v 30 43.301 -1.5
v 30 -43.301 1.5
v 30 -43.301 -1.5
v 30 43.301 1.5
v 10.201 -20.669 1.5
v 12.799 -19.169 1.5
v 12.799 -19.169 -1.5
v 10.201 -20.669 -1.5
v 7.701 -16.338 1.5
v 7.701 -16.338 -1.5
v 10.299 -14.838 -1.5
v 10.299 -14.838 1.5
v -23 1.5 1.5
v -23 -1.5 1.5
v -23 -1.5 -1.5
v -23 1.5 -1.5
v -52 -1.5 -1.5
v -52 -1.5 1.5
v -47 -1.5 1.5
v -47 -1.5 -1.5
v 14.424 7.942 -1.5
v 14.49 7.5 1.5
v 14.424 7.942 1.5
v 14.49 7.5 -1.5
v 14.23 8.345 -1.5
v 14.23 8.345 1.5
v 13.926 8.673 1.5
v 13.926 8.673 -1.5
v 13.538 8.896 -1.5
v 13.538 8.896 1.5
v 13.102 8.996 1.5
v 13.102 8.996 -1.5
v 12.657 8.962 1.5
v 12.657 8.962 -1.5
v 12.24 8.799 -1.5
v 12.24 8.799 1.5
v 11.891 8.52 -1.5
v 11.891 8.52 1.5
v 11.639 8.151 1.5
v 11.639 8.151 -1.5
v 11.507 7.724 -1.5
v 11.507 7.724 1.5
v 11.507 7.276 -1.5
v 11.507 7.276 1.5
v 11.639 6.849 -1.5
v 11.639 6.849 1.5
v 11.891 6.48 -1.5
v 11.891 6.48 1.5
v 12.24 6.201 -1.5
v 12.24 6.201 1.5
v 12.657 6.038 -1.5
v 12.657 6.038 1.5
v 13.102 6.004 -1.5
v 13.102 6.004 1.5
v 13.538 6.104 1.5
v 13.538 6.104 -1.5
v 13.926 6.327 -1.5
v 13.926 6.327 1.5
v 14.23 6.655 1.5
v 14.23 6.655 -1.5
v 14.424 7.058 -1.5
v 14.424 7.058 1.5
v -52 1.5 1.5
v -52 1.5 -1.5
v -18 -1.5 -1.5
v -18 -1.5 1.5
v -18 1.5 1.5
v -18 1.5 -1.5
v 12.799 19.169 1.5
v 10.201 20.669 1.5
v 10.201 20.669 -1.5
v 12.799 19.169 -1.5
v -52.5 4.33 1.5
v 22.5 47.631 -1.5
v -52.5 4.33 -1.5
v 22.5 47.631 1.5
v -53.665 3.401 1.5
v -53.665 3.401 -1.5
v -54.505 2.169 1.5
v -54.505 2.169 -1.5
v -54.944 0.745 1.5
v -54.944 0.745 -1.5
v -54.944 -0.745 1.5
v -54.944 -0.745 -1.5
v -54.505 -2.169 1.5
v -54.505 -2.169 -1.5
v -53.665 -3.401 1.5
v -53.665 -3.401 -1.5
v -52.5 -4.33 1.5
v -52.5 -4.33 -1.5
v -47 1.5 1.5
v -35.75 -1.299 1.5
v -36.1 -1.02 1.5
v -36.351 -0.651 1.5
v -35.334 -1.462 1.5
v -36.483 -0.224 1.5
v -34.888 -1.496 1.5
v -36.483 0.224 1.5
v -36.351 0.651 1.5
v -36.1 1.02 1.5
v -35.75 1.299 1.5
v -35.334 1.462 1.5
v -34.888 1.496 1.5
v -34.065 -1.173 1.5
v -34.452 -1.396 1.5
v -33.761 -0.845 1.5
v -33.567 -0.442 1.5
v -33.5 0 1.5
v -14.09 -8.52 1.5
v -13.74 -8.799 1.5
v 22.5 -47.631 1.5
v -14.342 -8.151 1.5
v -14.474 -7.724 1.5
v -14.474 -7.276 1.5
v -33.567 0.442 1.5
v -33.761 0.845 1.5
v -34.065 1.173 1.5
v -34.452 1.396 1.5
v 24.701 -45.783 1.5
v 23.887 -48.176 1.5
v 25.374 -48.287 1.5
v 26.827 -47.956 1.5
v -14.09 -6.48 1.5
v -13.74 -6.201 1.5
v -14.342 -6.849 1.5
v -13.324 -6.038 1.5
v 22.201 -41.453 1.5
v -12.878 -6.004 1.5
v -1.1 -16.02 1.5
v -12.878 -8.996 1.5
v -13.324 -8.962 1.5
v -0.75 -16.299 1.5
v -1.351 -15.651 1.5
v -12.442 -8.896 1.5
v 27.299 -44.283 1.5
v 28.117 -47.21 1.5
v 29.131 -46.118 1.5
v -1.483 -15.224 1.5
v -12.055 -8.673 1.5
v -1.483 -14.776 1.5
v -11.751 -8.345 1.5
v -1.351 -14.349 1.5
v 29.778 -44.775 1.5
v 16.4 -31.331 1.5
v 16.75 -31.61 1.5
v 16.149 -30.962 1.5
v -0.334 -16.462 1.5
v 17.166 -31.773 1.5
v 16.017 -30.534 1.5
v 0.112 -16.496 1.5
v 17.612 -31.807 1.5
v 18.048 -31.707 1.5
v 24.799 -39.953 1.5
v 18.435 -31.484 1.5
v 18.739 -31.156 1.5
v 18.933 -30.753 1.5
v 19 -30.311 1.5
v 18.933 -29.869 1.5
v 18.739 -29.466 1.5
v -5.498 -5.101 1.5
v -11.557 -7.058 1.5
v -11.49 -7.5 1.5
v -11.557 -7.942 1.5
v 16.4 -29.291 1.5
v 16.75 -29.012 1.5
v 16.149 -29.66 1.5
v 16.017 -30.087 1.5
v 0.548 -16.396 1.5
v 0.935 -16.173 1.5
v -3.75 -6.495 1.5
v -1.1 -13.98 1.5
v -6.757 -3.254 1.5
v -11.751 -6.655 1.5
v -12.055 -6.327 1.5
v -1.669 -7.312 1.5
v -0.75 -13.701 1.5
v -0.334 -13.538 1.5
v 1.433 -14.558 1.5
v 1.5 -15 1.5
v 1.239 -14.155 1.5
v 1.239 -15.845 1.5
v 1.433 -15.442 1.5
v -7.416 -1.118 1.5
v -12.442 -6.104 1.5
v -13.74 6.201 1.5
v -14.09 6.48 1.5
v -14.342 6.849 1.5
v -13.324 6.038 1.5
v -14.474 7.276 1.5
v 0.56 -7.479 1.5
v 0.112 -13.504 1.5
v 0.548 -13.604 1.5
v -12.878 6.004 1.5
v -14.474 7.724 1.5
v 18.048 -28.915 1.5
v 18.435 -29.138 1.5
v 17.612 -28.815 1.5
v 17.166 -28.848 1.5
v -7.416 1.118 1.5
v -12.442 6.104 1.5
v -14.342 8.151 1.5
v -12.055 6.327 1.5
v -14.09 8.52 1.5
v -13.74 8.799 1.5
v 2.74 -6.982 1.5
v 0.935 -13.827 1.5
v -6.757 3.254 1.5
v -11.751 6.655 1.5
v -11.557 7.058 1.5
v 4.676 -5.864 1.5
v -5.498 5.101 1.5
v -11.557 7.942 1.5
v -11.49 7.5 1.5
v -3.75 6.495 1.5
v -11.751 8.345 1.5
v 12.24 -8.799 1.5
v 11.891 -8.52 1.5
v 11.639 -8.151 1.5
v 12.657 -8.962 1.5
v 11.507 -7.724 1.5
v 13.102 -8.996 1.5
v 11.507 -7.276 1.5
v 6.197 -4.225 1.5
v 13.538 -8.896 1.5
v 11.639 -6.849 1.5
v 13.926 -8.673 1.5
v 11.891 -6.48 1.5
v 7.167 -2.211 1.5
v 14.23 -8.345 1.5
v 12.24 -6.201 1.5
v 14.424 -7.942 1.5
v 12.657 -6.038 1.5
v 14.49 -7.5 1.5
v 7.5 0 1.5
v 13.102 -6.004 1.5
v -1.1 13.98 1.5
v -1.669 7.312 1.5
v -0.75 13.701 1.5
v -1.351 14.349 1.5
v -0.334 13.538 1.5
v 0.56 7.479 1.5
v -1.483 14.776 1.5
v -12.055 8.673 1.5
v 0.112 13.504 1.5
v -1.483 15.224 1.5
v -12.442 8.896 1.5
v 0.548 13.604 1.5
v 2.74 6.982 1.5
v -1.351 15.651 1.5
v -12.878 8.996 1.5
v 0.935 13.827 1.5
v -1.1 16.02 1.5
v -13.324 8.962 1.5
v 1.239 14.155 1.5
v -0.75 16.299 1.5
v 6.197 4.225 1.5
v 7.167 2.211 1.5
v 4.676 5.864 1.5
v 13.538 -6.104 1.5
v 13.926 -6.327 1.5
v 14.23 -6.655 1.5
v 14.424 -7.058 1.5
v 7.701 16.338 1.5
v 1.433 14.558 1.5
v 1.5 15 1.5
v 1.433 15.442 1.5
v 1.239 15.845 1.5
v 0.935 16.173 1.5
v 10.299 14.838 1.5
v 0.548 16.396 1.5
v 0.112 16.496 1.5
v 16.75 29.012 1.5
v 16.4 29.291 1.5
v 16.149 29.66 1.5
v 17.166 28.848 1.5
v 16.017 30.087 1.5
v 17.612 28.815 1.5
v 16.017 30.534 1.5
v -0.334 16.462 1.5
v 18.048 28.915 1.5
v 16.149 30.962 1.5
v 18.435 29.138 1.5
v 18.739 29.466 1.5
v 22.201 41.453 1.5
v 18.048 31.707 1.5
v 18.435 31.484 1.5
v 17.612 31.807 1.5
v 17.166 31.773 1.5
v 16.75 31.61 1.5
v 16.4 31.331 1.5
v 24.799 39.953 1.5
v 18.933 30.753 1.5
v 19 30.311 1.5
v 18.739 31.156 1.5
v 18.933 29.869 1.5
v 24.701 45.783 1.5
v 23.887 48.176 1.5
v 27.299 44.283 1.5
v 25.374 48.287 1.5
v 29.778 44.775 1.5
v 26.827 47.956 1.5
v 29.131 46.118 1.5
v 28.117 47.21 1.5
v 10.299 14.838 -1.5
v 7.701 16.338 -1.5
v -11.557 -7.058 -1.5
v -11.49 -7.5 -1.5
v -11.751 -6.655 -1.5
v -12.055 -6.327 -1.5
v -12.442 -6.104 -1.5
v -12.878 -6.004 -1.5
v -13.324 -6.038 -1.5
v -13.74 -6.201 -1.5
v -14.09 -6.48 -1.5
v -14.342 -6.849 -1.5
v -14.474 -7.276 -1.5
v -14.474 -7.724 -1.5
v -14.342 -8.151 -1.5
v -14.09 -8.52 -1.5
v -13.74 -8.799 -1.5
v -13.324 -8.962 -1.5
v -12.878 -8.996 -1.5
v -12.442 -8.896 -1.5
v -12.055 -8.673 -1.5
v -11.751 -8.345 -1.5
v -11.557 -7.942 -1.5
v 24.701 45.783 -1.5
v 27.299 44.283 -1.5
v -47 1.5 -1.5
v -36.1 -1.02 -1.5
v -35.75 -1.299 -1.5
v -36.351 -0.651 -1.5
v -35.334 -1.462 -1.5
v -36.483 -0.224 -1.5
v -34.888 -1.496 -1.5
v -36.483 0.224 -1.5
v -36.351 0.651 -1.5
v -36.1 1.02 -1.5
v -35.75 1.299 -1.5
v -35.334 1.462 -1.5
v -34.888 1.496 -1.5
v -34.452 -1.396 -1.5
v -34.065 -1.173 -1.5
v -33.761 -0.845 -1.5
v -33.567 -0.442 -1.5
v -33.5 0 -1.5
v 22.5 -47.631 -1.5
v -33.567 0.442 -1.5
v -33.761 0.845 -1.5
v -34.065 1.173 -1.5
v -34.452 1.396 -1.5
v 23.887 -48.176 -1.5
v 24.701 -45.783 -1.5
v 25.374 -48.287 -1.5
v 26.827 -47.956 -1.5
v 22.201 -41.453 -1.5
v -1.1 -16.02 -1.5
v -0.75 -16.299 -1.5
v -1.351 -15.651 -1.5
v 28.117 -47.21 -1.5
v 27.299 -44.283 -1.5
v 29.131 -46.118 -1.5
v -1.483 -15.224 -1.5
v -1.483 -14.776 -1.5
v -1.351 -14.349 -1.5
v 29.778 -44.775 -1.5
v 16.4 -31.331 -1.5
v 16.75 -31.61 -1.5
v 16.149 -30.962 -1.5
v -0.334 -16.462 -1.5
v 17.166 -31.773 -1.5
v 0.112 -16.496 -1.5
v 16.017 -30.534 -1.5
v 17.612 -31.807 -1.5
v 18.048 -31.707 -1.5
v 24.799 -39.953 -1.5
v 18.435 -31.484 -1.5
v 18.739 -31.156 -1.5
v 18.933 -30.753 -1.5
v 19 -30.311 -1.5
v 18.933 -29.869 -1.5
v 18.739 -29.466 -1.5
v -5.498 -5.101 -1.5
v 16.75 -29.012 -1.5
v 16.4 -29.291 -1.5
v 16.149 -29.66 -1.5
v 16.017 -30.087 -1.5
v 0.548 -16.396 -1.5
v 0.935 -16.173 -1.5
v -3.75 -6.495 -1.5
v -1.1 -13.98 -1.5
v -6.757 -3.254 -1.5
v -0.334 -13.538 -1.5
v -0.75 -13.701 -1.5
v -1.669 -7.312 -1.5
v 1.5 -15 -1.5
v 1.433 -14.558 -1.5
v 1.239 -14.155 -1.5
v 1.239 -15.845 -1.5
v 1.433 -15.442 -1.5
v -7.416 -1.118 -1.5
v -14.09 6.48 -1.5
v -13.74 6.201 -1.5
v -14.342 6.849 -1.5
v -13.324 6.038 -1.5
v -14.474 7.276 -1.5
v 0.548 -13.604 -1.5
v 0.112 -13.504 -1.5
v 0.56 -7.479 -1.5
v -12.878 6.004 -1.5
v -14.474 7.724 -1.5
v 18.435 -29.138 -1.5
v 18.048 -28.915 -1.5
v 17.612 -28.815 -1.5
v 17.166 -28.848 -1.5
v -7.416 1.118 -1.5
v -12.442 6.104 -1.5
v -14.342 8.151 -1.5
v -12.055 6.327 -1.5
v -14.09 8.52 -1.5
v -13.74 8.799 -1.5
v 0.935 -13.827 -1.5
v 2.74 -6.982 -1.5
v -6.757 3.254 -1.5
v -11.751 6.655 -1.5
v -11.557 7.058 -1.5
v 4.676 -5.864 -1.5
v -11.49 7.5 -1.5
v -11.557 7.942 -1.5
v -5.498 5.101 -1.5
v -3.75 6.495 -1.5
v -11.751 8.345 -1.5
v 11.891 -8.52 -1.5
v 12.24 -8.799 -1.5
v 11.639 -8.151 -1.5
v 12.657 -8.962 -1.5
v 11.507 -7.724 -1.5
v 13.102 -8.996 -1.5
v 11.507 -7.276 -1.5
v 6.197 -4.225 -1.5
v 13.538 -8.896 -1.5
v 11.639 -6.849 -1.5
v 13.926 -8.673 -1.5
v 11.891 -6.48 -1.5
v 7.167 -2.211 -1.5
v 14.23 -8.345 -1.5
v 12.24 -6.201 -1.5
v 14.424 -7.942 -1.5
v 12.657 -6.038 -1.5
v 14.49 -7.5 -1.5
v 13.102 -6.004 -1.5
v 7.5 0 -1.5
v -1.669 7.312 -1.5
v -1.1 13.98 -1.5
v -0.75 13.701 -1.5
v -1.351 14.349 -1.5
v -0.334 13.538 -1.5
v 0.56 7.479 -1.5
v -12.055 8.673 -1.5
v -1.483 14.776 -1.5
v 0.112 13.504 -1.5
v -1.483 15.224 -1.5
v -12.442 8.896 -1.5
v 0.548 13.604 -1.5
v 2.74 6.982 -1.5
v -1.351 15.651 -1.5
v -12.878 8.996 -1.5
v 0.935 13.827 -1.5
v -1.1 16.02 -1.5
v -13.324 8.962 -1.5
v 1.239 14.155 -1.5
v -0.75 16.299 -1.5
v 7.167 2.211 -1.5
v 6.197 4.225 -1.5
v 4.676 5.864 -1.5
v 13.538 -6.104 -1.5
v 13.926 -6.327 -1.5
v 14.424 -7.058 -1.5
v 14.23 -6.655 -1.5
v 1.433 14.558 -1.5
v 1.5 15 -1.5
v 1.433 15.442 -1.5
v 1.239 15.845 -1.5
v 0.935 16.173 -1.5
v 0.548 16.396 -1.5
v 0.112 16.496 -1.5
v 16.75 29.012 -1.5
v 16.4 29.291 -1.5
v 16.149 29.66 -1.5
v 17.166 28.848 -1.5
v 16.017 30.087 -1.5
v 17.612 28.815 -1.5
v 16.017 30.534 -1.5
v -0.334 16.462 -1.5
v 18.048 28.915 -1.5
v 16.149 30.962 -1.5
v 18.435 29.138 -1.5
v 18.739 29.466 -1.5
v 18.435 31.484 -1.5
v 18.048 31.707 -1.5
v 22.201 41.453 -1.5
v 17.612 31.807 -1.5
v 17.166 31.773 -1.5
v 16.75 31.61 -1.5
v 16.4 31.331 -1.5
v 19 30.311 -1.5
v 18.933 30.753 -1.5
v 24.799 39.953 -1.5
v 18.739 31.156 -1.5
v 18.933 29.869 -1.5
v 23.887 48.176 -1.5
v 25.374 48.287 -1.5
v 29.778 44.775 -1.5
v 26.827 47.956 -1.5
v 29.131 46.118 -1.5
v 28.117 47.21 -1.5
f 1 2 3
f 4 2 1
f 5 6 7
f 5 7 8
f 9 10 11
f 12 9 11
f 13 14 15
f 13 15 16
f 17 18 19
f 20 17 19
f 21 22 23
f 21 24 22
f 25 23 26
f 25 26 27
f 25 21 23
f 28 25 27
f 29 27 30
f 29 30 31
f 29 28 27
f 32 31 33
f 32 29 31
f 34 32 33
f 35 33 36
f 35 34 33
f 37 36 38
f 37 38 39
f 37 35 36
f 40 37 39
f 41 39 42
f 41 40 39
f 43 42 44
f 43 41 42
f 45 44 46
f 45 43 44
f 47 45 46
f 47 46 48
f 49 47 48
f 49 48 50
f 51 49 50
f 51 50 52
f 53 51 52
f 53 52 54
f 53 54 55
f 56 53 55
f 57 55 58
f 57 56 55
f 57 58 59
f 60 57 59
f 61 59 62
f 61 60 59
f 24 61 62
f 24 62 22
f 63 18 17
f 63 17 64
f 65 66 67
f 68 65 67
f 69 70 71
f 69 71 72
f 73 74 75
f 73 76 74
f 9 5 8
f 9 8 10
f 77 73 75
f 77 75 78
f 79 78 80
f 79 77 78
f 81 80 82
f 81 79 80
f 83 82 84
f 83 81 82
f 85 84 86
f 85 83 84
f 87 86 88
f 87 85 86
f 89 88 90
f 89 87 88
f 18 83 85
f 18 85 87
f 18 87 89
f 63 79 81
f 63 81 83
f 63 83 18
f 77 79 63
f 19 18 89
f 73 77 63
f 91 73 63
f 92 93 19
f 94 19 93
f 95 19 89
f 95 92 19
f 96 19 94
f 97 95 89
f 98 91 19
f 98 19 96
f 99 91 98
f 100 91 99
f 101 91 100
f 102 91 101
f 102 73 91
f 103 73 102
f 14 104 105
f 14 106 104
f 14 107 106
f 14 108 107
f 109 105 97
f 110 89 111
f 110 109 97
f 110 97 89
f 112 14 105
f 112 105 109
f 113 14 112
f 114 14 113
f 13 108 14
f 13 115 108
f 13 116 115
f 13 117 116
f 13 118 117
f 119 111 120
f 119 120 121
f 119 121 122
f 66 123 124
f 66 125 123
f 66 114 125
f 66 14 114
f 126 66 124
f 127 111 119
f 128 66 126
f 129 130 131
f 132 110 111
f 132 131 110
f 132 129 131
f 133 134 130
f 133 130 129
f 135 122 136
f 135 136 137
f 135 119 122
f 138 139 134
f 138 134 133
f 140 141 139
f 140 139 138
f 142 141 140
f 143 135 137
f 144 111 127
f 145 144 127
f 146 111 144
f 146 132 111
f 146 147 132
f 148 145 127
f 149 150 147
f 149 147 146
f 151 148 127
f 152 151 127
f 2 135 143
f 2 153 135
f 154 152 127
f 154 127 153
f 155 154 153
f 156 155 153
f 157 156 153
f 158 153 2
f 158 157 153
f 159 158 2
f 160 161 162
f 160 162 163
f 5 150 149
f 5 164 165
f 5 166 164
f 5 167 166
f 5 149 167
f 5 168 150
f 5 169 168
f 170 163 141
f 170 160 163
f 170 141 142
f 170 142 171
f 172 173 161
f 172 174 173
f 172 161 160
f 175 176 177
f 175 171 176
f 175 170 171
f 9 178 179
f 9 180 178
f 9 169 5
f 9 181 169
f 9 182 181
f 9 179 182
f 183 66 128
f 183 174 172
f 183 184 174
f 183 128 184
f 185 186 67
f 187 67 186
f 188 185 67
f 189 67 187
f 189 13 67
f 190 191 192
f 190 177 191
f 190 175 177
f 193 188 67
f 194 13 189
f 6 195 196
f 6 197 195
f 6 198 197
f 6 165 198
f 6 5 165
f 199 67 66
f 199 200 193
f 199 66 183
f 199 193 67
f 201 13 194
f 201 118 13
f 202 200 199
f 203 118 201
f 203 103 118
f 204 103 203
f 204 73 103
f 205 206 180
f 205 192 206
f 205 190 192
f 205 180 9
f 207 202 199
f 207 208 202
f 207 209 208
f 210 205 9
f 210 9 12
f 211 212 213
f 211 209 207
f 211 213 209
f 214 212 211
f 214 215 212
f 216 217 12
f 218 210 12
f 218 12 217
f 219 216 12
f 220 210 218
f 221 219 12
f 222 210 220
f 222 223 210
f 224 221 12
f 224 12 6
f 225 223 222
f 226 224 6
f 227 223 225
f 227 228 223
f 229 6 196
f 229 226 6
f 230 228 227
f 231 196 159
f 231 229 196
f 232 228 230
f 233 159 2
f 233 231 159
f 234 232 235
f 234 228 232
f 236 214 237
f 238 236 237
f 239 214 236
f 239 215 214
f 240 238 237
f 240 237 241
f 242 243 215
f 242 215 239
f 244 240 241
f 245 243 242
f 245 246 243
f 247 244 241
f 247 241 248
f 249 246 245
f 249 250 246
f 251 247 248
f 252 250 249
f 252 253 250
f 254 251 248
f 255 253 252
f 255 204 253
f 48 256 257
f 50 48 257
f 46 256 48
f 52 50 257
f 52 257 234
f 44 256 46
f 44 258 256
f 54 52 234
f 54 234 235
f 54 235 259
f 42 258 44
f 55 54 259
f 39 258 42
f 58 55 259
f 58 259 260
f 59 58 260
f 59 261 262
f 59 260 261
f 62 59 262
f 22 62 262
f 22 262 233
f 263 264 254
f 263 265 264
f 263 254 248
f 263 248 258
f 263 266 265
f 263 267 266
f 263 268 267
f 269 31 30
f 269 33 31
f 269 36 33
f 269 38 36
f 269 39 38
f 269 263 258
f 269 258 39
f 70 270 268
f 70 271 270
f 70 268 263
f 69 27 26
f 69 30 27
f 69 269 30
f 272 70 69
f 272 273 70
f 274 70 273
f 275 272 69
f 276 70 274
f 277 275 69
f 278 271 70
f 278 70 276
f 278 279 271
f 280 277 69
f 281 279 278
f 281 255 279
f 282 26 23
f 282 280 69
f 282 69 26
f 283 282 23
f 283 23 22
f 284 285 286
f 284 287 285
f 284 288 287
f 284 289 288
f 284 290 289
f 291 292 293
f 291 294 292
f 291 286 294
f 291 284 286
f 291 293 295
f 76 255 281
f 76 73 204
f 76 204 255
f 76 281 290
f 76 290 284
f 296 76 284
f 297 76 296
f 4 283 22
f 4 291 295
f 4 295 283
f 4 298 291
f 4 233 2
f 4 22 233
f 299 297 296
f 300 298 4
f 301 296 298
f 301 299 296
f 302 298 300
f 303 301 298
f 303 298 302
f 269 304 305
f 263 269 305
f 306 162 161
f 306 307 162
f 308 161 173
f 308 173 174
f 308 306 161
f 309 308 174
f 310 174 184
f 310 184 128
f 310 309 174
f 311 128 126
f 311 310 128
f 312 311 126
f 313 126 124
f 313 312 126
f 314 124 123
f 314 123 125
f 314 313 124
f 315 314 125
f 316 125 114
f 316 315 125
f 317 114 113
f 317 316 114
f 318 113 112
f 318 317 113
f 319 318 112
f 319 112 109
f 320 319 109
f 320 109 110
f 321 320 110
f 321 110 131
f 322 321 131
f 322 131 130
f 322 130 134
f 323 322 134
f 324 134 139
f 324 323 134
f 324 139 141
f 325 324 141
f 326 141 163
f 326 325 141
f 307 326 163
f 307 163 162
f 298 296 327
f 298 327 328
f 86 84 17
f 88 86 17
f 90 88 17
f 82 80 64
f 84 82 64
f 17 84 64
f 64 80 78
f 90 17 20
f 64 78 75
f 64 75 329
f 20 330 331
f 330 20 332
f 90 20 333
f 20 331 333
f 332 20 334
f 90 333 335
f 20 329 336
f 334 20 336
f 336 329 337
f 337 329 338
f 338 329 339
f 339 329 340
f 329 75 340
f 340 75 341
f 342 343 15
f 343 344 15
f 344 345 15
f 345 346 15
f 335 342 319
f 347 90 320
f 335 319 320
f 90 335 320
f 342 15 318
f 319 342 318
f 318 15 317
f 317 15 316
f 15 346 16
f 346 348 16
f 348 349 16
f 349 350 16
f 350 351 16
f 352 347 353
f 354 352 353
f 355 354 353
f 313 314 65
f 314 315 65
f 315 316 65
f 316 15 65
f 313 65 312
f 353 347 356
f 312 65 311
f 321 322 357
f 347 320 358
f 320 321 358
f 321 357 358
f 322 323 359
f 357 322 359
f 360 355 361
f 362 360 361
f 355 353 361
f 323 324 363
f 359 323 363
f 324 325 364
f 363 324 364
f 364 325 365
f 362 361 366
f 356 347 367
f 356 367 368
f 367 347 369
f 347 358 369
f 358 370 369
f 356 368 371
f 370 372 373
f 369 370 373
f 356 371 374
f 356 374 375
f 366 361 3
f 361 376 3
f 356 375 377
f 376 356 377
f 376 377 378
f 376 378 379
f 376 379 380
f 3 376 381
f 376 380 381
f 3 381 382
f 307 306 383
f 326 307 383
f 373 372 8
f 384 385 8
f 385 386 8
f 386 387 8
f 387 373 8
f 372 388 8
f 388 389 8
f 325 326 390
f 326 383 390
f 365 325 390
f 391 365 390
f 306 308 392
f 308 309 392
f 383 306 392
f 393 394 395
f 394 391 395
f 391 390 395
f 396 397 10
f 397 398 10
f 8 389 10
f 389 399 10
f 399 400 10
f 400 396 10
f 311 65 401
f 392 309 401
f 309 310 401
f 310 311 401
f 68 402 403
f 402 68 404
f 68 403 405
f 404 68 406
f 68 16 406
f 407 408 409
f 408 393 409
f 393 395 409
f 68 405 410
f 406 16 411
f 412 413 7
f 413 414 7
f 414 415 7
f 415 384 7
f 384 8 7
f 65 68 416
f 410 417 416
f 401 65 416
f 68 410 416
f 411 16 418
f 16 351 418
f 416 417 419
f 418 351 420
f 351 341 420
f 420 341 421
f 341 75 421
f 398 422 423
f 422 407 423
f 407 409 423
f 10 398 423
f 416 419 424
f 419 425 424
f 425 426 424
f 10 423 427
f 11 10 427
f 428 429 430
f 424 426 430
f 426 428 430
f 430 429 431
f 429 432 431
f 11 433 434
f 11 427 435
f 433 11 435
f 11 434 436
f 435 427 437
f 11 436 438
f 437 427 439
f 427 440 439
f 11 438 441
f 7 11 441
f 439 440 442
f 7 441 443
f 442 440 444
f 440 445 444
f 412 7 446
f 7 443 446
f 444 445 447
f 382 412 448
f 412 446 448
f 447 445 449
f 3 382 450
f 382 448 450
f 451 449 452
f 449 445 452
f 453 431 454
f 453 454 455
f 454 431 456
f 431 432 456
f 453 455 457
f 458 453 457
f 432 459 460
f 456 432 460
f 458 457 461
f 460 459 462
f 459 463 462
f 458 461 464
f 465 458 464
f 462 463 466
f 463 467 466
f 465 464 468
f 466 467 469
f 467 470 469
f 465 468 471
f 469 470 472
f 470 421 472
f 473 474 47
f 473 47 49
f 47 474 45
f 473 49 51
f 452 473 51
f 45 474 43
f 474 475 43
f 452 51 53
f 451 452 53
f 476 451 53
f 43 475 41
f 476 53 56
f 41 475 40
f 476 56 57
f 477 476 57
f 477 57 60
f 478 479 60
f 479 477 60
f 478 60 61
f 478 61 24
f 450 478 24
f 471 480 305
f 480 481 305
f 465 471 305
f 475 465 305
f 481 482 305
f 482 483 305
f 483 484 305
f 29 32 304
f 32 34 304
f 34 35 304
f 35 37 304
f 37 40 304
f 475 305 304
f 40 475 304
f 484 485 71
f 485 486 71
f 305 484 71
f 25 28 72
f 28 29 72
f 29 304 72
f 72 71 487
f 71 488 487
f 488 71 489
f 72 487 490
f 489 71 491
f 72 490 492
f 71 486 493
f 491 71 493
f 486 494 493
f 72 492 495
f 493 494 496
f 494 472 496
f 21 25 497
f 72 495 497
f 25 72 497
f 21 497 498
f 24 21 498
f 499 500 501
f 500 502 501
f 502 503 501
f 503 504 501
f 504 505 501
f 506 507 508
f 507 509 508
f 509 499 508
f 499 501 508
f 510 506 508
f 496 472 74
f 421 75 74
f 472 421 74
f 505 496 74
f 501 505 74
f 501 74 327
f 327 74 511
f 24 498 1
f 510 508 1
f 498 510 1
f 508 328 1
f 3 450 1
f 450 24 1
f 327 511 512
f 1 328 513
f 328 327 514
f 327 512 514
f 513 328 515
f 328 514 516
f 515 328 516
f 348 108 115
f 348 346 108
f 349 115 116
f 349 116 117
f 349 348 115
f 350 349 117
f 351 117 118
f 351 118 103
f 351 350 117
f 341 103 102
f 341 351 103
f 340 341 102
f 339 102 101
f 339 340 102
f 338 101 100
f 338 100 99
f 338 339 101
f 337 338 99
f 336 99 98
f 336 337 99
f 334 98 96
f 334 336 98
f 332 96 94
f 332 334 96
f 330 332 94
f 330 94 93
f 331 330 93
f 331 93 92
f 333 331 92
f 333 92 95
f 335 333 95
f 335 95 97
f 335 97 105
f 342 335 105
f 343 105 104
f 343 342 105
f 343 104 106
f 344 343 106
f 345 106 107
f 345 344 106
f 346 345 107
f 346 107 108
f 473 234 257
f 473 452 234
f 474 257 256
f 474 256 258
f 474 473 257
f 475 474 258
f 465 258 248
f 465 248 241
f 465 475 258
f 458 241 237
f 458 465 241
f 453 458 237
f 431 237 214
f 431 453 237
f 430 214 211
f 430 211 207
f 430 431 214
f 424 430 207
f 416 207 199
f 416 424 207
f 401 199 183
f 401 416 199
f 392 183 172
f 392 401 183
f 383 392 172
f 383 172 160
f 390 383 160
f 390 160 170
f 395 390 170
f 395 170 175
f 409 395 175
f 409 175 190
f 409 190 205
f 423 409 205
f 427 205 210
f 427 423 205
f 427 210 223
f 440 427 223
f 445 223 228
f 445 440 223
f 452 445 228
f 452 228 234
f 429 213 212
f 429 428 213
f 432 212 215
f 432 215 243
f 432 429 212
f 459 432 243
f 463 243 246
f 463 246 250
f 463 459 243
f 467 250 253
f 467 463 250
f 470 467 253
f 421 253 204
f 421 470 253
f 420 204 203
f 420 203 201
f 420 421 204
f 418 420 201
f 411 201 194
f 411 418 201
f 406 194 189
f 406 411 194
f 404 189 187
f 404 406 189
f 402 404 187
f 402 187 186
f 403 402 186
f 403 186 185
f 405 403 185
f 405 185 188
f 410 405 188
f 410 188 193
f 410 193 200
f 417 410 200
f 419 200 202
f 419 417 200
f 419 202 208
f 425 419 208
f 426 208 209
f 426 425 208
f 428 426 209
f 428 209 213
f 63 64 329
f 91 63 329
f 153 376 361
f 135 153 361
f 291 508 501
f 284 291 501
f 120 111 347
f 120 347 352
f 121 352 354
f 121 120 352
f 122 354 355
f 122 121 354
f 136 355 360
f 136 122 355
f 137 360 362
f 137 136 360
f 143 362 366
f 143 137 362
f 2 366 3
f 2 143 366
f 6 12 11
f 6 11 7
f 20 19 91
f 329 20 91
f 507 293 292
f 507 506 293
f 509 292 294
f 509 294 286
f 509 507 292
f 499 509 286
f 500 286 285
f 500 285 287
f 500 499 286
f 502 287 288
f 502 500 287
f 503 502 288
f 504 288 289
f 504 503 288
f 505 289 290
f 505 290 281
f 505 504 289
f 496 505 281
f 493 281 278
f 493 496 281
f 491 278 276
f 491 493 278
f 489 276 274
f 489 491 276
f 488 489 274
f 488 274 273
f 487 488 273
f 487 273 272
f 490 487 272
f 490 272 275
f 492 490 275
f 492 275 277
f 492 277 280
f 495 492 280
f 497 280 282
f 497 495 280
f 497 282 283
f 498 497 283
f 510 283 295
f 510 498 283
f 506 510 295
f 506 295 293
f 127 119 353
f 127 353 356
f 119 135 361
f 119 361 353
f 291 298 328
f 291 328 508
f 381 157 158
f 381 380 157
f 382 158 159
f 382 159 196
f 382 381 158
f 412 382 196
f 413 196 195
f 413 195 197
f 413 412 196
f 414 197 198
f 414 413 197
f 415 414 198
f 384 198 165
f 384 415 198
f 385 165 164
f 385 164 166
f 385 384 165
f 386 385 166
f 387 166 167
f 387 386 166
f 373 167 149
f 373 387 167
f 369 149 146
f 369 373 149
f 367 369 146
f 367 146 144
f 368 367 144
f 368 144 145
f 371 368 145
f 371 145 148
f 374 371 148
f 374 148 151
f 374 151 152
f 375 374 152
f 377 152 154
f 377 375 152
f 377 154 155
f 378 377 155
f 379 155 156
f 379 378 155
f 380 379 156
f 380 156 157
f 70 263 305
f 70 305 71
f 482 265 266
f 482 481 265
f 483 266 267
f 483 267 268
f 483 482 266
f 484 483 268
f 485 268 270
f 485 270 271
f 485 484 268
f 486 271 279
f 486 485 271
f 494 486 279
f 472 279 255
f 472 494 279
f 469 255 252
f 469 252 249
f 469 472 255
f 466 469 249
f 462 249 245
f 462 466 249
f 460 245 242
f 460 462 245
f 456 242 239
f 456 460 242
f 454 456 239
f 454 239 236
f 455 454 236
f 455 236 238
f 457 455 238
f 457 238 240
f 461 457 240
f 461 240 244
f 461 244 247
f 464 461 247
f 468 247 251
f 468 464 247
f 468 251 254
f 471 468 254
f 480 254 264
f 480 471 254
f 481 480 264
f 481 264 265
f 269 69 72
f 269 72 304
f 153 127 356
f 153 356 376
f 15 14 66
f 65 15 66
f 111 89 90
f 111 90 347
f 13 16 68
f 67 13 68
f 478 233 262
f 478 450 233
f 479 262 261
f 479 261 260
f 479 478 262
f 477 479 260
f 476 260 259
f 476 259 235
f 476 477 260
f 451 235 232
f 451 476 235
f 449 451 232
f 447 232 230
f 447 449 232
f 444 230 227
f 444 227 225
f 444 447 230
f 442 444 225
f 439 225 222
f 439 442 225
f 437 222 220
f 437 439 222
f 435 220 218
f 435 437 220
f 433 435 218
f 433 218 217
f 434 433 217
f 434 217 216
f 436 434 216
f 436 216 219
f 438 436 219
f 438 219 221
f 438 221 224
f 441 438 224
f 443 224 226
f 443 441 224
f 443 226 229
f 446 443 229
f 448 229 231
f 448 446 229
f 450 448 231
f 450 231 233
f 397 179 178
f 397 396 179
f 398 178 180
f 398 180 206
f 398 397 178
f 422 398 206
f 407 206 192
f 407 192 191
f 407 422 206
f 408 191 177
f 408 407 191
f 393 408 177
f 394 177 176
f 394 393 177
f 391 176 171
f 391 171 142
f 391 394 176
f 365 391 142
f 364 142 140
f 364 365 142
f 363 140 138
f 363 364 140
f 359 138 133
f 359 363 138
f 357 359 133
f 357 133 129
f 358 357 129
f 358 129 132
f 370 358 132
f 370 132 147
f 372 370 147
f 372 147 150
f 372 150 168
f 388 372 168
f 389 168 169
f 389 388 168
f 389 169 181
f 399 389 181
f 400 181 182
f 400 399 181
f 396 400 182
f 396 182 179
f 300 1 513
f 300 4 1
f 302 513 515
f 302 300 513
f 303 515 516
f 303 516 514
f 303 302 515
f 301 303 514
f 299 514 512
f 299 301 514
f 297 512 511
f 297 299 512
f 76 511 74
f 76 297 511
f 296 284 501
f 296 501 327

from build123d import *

# Parameters (mm, degrees)
F0_W     = 5
F0_H     = 3
F0_R     = 1.5
F0_R_2   = 7.5
F1_DEPTH = 1.5


with BuildPart() as f1:
    # F0 (on Top) → F1 (new body, symmetric)
    with BuildSketch(Plane.XY):
        with BuildLine():
            Line((22.5, 47.6313972081), (-52.5, 4.3301270189))
            ThreePointArc((-52.5, 4.3301270189), (-55, 0), (-52.5, -4.3301270189))
            Line((-52.5, -4.3301270189), (22.5, -47.6313972081))
            ThreePointArc((22.5, -47.6313972081), (27.5, -47.6313972081), (30, -43.3012701892))
            Line((30, -43.3012701892), (30, 43.3012701892))
            ThreePointArc((30, 43.3012701892), (27.5, 47.6313972081), (22.5, 47.6313972081))
        make_face()
        with Locations((-49.5, 0)):
            Rectangle(F0_W, F0_H, mode=Mode.SUBTRACT)
        with Locations((-35, 0)):
            Circle(F0_R, mode=Mode.SUBTRACT)
        with Locations((-12.9903810568, -7.5)):
            Circle(F0_R, mode=Mode.SUBTRACT)
        with Locations((-20.5, 0)):
            Rectangle(F0_W, F0_H, mode=Mode.SUBTRACT)
        Polygon((22.2009618943, -41.4531939779), (24.7990381057, -39.9531939779), (27.2990381057, -44.2833209968), (24.7009618943, -45.7833209968), align=None, mode=Mode.SUBTRACT)
        with Locations((17.5, -30.3108891325)):
            Circle(F0_R, mode=Mode.SUBTRACT)
        with Locations((0, -15)):
            Circle(F0_R, mode=Mode.SUBTRACT)
        Circle(F0_R_2, mode=Mode.SUBTRACT)
        Polygon((10.2009618943, -20.668584287), (7.7009618943, -16.3384572681), (10.2990381057, -14.8384572681), (12.7990381057, -19.168584287), align=None, mode=Mode.SUBTRACT)
        with Locations((12.9903810568, -7.5)):
            Circle(F0_R, mode=Mode.SUBTRACT)
        with Locations((-12.9903810568, 7.5)):
            Circle(F0_R, mode=Mode.SUBTRACT)
        with Locations((0, 15)):
            Circle(F0_R, mode=Mode.SUBTRACT)
        with Locations((12.9903810568, 7.5)):
            Circle(F0_R, mode=Mode.SUBTRACT)
        Polygon((12.7990381057, 19.168584287), (10.2990381057, 14.8384572681), (7.7009618943, 16.3384572681), (10.2009618943, 20.668584287), align=None, mode=Mode.SUBTRACT)
        with Locations((17.5, 30.3108891325)):
            Circle(F0_R, mode=Mode.SUBTRACT)
        Polygon((24.7990381057, 39.9531939779), (22.2009618943, 41.4531939779), (24.7009618943, 45.7833209968), (27.2990381057, 44.2833209968), align=None, mode=Mode.SUBTRACT)
    extrude(amount=F1_DEPTH, both=True)


solid = f1.part
